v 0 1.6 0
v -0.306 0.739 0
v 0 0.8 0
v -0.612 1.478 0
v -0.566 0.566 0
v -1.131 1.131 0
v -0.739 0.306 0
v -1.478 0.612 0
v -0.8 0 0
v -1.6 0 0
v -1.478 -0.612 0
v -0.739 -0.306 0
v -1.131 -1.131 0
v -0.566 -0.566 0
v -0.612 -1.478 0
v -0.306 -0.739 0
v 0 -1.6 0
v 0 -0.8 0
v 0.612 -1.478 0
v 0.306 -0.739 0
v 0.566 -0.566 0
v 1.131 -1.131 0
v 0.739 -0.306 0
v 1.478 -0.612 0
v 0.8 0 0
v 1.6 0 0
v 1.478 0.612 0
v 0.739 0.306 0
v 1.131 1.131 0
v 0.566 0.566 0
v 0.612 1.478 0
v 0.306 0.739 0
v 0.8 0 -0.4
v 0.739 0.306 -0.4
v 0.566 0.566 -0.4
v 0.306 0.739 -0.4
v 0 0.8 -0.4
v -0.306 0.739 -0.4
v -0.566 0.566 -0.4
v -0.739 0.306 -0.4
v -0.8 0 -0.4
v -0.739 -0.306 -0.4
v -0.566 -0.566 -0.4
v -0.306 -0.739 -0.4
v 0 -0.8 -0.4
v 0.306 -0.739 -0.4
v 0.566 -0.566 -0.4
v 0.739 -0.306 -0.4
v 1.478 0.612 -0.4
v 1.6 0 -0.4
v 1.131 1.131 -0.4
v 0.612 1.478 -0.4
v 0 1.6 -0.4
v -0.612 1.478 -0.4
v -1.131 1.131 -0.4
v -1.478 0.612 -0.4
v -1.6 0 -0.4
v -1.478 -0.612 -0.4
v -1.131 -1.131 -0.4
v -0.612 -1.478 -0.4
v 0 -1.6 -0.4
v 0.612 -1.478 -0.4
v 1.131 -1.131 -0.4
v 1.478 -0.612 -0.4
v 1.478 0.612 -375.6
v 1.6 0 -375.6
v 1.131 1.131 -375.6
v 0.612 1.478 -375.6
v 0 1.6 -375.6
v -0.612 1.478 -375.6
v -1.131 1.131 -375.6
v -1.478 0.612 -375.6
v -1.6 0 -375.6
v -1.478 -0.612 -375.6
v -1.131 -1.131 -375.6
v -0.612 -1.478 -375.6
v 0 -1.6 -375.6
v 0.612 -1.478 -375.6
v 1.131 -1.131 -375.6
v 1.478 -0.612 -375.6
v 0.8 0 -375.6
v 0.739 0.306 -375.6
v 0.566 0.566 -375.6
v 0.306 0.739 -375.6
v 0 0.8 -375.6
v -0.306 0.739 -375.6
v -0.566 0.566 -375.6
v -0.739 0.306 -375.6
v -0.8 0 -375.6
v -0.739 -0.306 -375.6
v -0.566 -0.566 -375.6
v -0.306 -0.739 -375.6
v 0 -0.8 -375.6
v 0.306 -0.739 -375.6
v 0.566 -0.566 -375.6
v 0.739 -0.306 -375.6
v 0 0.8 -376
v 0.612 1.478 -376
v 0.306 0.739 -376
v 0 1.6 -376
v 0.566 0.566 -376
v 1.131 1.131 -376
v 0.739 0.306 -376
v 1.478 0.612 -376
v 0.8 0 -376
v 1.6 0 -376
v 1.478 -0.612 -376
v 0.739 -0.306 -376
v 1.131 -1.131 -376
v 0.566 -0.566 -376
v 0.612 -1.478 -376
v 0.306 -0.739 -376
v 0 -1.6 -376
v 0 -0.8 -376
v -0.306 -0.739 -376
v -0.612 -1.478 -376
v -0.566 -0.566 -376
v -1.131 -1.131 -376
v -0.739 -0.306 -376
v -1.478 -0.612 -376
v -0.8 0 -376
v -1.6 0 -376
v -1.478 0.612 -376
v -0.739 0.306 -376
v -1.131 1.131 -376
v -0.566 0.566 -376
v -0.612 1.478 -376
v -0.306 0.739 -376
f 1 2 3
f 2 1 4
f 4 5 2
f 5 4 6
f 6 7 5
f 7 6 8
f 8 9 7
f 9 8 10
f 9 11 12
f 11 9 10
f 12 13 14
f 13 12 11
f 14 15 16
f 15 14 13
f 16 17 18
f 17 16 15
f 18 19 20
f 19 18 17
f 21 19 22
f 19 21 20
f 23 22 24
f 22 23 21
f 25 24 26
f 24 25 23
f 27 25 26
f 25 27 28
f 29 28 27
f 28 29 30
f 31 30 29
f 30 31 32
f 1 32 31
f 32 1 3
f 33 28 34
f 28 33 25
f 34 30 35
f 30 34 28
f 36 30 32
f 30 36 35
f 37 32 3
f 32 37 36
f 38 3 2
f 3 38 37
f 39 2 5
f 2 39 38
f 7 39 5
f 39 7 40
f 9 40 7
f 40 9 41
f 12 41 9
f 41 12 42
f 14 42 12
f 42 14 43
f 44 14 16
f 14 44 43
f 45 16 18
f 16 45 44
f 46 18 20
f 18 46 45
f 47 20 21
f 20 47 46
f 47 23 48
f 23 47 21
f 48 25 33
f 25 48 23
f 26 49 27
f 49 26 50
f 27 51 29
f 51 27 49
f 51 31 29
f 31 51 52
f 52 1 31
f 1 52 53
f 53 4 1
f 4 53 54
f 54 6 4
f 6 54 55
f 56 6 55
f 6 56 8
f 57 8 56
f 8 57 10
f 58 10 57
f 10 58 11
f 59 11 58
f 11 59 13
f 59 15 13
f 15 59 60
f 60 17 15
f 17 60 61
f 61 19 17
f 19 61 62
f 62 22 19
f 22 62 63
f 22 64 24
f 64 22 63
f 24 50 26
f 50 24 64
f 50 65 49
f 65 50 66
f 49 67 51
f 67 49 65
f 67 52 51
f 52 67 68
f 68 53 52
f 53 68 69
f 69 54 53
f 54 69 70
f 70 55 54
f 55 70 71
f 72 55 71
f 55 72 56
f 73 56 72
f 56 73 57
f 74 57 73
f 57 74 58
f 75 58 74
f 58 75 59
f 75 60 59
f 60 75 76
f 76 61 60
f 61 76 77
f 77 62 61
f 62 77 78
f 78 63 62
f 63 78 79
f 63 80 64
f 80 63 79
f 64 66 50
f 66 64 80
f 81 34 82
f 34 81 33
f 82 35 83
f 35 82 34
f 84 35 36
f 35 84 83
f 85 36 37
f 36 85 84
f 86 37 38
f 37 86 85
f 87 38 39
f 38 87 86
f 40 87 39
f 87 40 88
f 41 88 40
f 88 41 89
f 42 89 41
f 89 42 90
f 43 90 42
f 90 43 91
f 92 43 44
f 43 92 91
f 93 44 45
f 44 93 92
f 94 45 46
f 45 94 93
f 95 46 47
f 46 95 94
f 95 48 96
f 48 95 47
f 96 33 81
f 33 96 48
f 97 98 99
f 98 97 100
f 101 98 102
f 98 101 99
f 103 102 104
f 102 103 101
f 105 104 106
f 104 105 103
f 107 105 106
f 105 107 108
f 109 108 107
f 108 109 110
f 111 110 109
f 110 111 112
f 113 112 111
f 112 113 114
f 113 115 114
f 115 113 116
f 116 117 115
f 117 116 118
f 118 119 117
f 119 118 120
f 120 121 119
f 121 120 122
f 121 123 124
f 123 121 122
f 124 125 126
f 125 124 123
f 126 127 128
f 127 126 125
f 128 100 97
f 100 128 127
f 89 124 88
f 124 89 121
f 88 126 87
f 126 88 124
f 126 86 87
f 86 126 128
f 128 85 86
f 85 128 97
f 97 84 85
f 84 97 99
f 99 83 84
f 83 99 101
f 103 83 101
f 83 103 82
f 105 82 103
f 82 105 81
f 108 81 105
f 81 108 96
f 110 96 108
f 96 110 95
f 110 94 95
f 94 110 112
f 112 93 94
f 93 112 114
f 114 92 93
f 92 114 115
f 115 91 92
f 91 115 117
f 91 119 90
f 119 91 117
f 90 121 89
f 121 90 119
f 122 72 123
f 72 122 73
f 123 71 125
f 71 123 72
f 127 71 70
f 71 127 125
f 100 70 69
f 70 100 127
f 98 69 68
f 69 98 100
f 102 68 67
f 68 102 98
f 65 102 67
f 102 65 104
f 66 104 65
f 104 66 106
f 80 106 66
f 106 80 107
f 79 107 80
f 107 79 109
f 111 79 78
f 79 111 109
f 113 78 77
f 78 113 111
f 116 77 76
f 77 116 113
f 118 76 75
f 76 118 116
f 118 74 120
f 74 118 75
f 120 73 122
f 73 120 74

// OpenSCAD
// file: ../p/4-4ring1.scad
use <../lib.scad>
function ldraw_lib__4_4ring1() = [
// 0 Ring  1 x 1.0
// 0 Name: 4-4ring1.dat
// 0 Author: James Jessiman
// 0 !LDRAW_ORG Primitive UPDATE 2009-01
// 0 !LICENSE Licensed under CC BY 4.0 : see CAreadme.txt
// 
// 0 BFC CERTIFY CCW
  [0,"BFC","CERTIFY"],
  [0,"BFC","CCW"],
// 
// 0 !HISTORY 1998-12-15 [PTadmin] Official Update 1998-10
// 0 !HISTORY 2002-04-08 [BrickCaster] Modified for BFC compliance
// 0 !HISTORY 2002-04-25 [PTadmin] Official Update 2002-02
// 0 !HISTORY 2007-06-24 [PTadmin] Header formatted for Contributor Agreement
// 0 !HISTORY 2008-07-01 [PTadmin] Official Update 2008-01
// 0 !HISTORY 2008-08-26 [cwdee] Switch polygon winding and rename
// 0 !HISTORY 2009-05-02 [PTadmin] Official Update 2009-01
// 
// 
// 4 16 -0.7654 0 1.8478 -0.3827 0 0.9239 0 0 1 0 0 2
  [4,16,-0.7654,0,1.8478,-0.3827,0,0.9239,0,0,1,0,0,2],
// 4 16 -1.4142 0 1.4142 -0.7071 0 0.7071 -0.3827 0 0.9239 -0.7654 0 1.8478
  [4,16,-1.4142,0,1.4142,-0.7071,0,0.7071,-0.3827,0,0.9239,-0.7654,0,1.8478],
// 4 16 -1.8478 0 0.7654 -0.9239 0 0.3827 -0.7071 0 0.7071 -1.4142 0 1.41420
  [4,16,-1.8478,0,0.7654,-0.9239,0,0.3827,-0.7071,0,0.7071,-1.4142,0,1.41420],
// 4 16 -2 0 0 -1 0 0 -0.9239 0 0.3827 -1.8478 0 0.7654
  [4,16,-2,0,0,-1,0,0,-0.9239,0,0.3827,-1.8478,0,0.7654],
// 4 16 -1.8478 0 -0.7654 -0.9239 0 -0.3827 -1 0 0 -2 0 0
  [4,16,-1.8478,0,-0.7654,-0.9239,0,-0.3827,-1,0,0,-2,0,0],
// 4 16 -1.4142 0 -1.4142 -0.7071 0 -0.7071 -0.9239 0 -0.3827 -1.8478 0 -0.7654
  [4,16,-1.4142,0,-1.4142,-0.7071,0,-0.7071,-0.9239,0,-0.3827,-1.8478,0,-0.7654],
// 4 16 -0.7654 0 -1.8478 -0.3827 0 -0.9239 -0.7071 0 -0.7071 -1.4142 0 -1.4142
  [4,16,-0.7654,0,-1.8478,-0.3827,0,-0.9239,-0.7071,0,-0.7071,-1.4142,0,-1.4142],
// 4 16 0 0 -2 0 0 -1 -0.3827 0 -0.9239 -0.7654 0 -1.8478
  [4,16,0,0,-2,0,0,-1,-0.3827,0,-0.9239,-0.7654,0,-1.8478],
// 4 16 0.7654 0 -1.8478 0.3827 0 -0.9239 0 0 -1 0 0 -2
  [4,16,0.7654,0,-1.8478,0.3827,0,-0.9239,0,0,-1,0,0,-2],
// 4 16 1.4142 0 -1.4142 0.7071 0 -0.7071 0.3827 0 -0.9239 0.7654 0 -1.8478
  [4,16,1.4142,0,-1.4142,0.7071,0,-0.7071,0.3827,0,-0.9239,0.7654,0,-1.8478],
// 4 16 1.8478 0 -0.7654 0.9239 0 -0.3827 0.7071 0 -0.7071 1.4142 0 -1.4142
  [4,16,1.8478,0,-0.7654,0.9239,0,-0.3827,0.7071,0,-0.7071,1.4142,0,-1.4142],
// 4 16 2 0 0 1 0 0 0.9239 0 -0.3827 1.8478 0 -0.7654
  [4,16,2,0,0,1,0,0,0.9239,0,-0.3827,1.8478,0,-0.7654],
// 4 16 1.8478 0 0.7654 0.9239 0 0.3827 1 0 0 2 0 0
  [4,16,1.8478,0,0.7654,0.9239,0,0.3827,1,0,0,2,0,0],
// 4 16 1.4142 0 1.4142 0.7071 0 0.7071 0.9239 0 0.3827 1.8478 0 0.7654
  [4,16,1.4142,0,1.4142,0.7071,0,0.7071,0.9239,0,0.3827,1.8478,0,0.7654],
// 4 16 0.7654 0 1.8478 0.3827 0 0.9239 0.7071 0 0.7071 1.4142 0 1.4142
  [4,16,0.7654,0,1.8478,0.3827,0,0.9239,0.7071,0,0.7071,1.4142,0,1.4142],
// 4 16 0 0 2 0 0 1 0.3827 0 0.9239 0.7654 0 1.8478
  [4,16,0,0,2,0,0,1,0.3827,0,0.9239,0.7654,0,1.8478],
// 0
];
module ldraw_lib__4_4ring1(step=0, col=false, unit=2/5, alt=false, line=0.2, solid=!$preview)
    makepoly(ldraw_lib__4_4ring1(), step=step, col=col, unit=unit, alt=alt, line=line, solid=solid);
ldraw_lib__4_4ring1(line=0.2);
// file: ../p/4-4edge.scad
use <../lib.scad>
function ldraw_lib__4_4edge() = [
// 0 Circle 1.0
// 0 Name: 4-4edge.dat
// 0 Author: James Jessiman
// 0 !LDRAW_ORG Primitive UPDATE 2017-01
// 0 !LICENSE Licensed under CC BY 4.0 : see CAreadme.txt
// 
// 0 BFC CERTIFY CCW
  [0,"BFC","CERTIFY"],
  [0,"BFC","CCW"],
// 
// 0 !HISTORY 1998-12-15 [PTadmin] Official Update 1998-10
// 0 !HISTORY 2005-12-28 [PTadmin] Official Update 2005-01
// 0 !HISTORY 2007-06-24 [PTadmin] Header formatted for Contributor Agreement
// 0 !HISTORY 2008-07-01 [PTadmin] Official Update 2008-01
// 0 !HISTORY 2017-01-15 [Steffen] BFCed
// 0 !HISTORY 2017-12-30 [PTadmin] Official Update 2017-01
// 
// 
// 2 24 1 0 0 0.9239 0 0.3827
  [2,24,1,0,0,0.9239,0,0.3827],
// 2 24 0.9239 0 0.3827 0.7071 0 0.7071
  [2,24,0.9239,0,0.3827,0.7071,0,0.7071],
// 2 24 0.7071 0 0.7071 0.3827 0 0.9239
  [2,24,0.7071,0,0.7071,0.3827,0,0.9239],
// 2 24 0.3827 0 0.9239 0 0 1
  [2,24,0.3827,0,0.9239,0,0,1],
// 2 24 0 0 1 -0.3827 0 0.9239
  [2,24,0,0,1,-0.3827,0,0.9239],
// 2 24 -0.3827 0 0.9239 -0.7071 0 0.7071
  [2,24,-0.3827,0,0.9239,-0.7071,0,0.7071],
// 2 24 -0.7071 0 0.7071 -0.9239 0 0.3827
  [2,24,-0.7071,0,0.7071,-0.9239,0,0.3827],
// 2 24 -0.9239 0 0.3827 -1 0 -0
  [2,24,-0.9239,0,0.3827,-1,0,-0],
// 2 24 -1 0 -0 -0.9239 0 -0.3827
  [2,24,-1,0,-0,-0.9239,0,-0.3827],
// 2 24 -0.9239 0 -0.3827 -0.7071 0 -0.7071
  [2,24,-0.9239,0,-0.3827,-0.7071,0,-0.7071],
// 2 24 -0.7071 0 -0.7071 -0.3827 0 -0.9239
  [2,24,-0.7071,0,-0.7071,-0.3827,0,-0.9239],
// 2 24 -0.3827 0 -0.9239 0 0 -1
  [2,24,-0.3827,0,-0.9239,0,0,-1],
// 2 24 0 0 -1 0.3827 0 -0.9239
  [2,24,0,0,-1,0.3827,0,-0.9239],
// 2 24 0.3827 0 -0.9239 0.7071 0 -0.7071
  [2,24,0.3827,0,-0.9239,0.7071,0,-0.7071],
// 2 24 0.7071 0 -0.7071 0.9239 0 -0.3827
  [2,24,0.7071,0,-0.7071,0.9239,0,-0.3827],
// 2 24 0.9239 0 -0.3827 1 0 0
  [2,24,0.9239,0,-0.3827,1,0,0],
];
module ldraw_lib__4_4edge(step=0, col=false, unit=2/5, alt=false, line=0.2, solid=!$preview)
    makepoly(ldraw_lib__4_4edge(), step=step, col=col, unit=unit, alt=alt, line=line, solid=solid);
ldraw_lib__4_4edge(line=0.2);
// file: ../p/4-4cyli.scad
use <../lib.scad>
function ldraw_lib__4_4cyli() = [
// 0 Cylinder 1.0
// 0 Name: 4-4cyli.dat
// 0 Author: James Jessiman
// 0 !LDRAW_ORG Primitive UPDATE 2005-01
// 0 !LICENSE Licensed under CC BY 4.0 : see CAreadme.txt
// 
// 0 BFC CERTIFY CCW
  [0,"BFC","CERTIFY"],
  [0,"BFC","CCW"],
// 
// 0 !HISTORY 1998-12-15 [PTadmin] Official Update 1998-10
// 0 !HISTORY 2002-03-23 [sbliss] Added BFC statement; merged headers from files in distributions LDraw 0.27 and Complete.
// 0 !HISTORY 2002-04-25 [PTadmin] Official Update 2002-02
// 0 !HISTORY 2004-12-14 [guyvivan] BFC CCW
// 0 !HISTORY 2005-12-28 [PTadmin] Official Update 2005-01
// 0 !HISTORY 2007-06-24 [PTadmin] Header formatted for Contributor Agreement
// 0 !HISTORY 2008-07-01 [PTadmin] Official Update 2008-01
// 
// 
// 4 16 1 1 0 0.9239 1 0.3827 0.9239 0 0.3827 1 0 0
  [4,16,1,1,0,0.9239,1,0.3827,0.9239,0,0.3827,1,0,0],
// 5 24 1 0 0 1 1 0 0.9239 0 0.3827 0.9239 0 -0.3827
  [5,24,1,0,0,1,1,0,0.9239,0,0.3827,0.9239,0,-0.3827],
// 4 16 0.9239 1 0.3827 0.7071 1 0.7071 0.7071 0 0.7071 0.9239 0 0.3827
  [4,16,0.9239,1,0.3827,0.7071,1,0.7071,0.7071,0,0.7071,0.9239,0,0.3827],
// 5 24 0.9239 0 0.3827 0.9239 1 0.3827 0.7071 0 0.7071 1 0 0
  [5,24,0.9239,0,0.3827,0.9239,1,0.3827,0.7071,0,0.7071,1,0,0],
// 4 16 0.7071 1 0.7071 0.3827 1 0.9239 0.3827 0 0.9239 0.7071 0 0.7071
  [4,16,0.7071,1,0.7071,0.3827,1,0.9239,0.3827,0,0.9239,0.7071,0,0.7071],
// 5 24 0.7071 0 0.7071 0.7071 1 0.7071 0.3827 0 0.9239 0.9239 0 0.3827
  [5,24,0.7071,0,0.7071,0.7071,1,0.7071,0.3827,0,0.9239,0.9239,0,0.3827],
// 4 16 0.3827 1 0.9239 0 1 1 0 0 1 0.3827 0 0.9239
  [4,16,0.3827,1,0.9239,0,1,1,0,0,1,0.3827,0,0.9239],
// 5 24 0.3827 0 0.9239 0.3827 1 0.9239 0 0 1 0.7071 0 0.7071
  [5,24,0.3827,0,0.9239,0.3827,1,0.9239,0,0,1,0.7071,0,0.7071],
// 4 16 0 1 1 -0.3827 1 0.9239 -0.3827 0 0.9239 0 0 1
  [4,16,0,1,1,-0.3827,1,0.9239,-0.3827,0,0.9239,0,0,1],
// 5 24 0 0 1 0 1 1 -0.3827 0 0.9239 0.3827 0 0.9239
  [5,24,0,0,1,0,1,1,-0.3827,0,0.9239,0.3827,0,0.9239],
// 4 16 -0.3827 1 0.9239 -0.7071 1 0.7071 -0.7071 0 0.7071 -0.3827 0 0.9239
  [4,16,-0.3827,1,0.9239,-0.7071,1,0.7071,-0.7071,0,0.7071,-0.3827,0,0.9239],
// 5 24 -0.3827 0 0.9239 -0.3827 1 0.9239 -0.7071 0 0.7071 0 0 1
  [5,24,-0.3827,0,0.9239,-0.3827,1,0.9239,-0.7071,0,0.7071,0,0,1],
// 4 16 -0.7071 1 0.7071 -0.9239 1 0.3827 -0.9239 0 0.3827 -0.7071 0 0.7071
  [4,16,-0.7071,1,0.7071,-0.9239,1,0.3827,-0.9239,0,0.3827,-0.7071,0,0.7071],
// 5 24 -0.7071 0 0.7071 -0.7071 1 0.7071 -0.9239 0 0.3827 -0.3827 0 0.9239
  [5,24,-0.7071,0,0.7071,-0.7071,1,0.7071,-0.9239,0,0.3827,-0.3827,0,0.9239],
// 4 16 -0.9239 1 0.3827 -1 1 0 -1 0 0 -0.9239 0 0.3827
  [4,16,-0.9239,1,0.3827,-1,1,0,-1,0,0,-0.9239,0,0.3827],
// 5 24 -0.9239 0 0.3827 -0.9239 1 0.3827 -1 0 0 -0.7071 0 0.7071
  [5,24,-0.9239,0,0.3827,-0.9239,1,0.3827,-1,0,0,-0.7071,0,0.7071],
// 4 16 -1 1 0 -0.9239 1 -0.3827 -0.9239 0 -0.3827 -1 0 0
  [4,16,-1,1,0,-0.9239,1,-0.3827,-0.9239,0,-0.3827,-1,0,0],
// 5 24 -1 0 0 -1 1 0 -0.9239 0 -0.3827 -0.9239 0 0.3827
  [5,24,-1,0,0,-1,1,0,-0.9239,0,-0.3827,-0.9239,0,0.3827],
// 4 16 -0.9239 1 -0.3827 -0.7071 1 -0.7071 -0.7071 0 -0.7071 -0.9239 0 -0.3827
  [4,16,-0.9239,1,-0.3827,-0.7071,1,-0.7071,-0.7071,0,-0.7071,-0.9239,0,-0.3827],
// 5 24 -0.9239 0 -0.3827 -0.9239 1 -0.3827 -0.7071 0 -0.7071 -1 0 0
  [5,24,-0.9239,0,-0.3827,-0.9239,1,-0.3827,-0.7071,0,-0.7071,-1,0,0],
// 4 16 -0.7071 1 -0.7071 -0.3827 1 -0.9239 -0.3827 0 -0.9239 -0.7071 0 -0.7071
  [4,16,-0.7071,1,-0.7071,-0.3827,1,-0.9239,-0.3827,0,-0.9239,-0.7071,0,-0.7071],
// 5 24 -0.7071 0 -0.7071 -0.7071 1 -0.7071 -0.3827 0 -0.9239 -0.9239 0 -0.3827
  [5,24,-0.7071,0,-0.7071,-0.7071,1,-0.7071,-0.3827,0,-0.9239,-0.9239,0,-0.3827],
// 4 16 -0.3827 1 -0.9239 0 1 -1 0 0 -1 -0.3827 0 -0.9239
  [4,16,-0.3827,1,-0.9239,0,1,-1,0,0,-1,-0.3827,0,-0.9239],
// 5 24 -0.3827 0 -0.9239 -0.3827 1 -0.9239 0 0 -1 -0.7071 0 -0.7071
  [5,24,-0.3827,0,-0.9239,-0.3827,1,-0.9239,0,0,-1,-0.7071,0,-0.7071],
// 4 16 0 1 -1 0.3827 1 -0.9239 0.3827 0 -0.9239 0 0 -1
  [4,16,0,1,-1,0.3827,1,-0.9239,0.3827,0,-0.9239,0,0,-1],
// 5 24 0 0 -1 0 1 -1 0.3827 0 -0.9239 -0.3827 0 -0.9239
  [5,24,0,0,-1,0,1,-1,0.3827,0,-0.9239,-0.3827,0,-0.9239],
// 4 16 0.3827 1 -0.9239 0.7071 1 -0.7071 0.7071 0 -0.7071 0.3827 0 -0.9239
  [4,16,0.3827,1,-0.9239,0.7071,1,-0.7071,0.7071,0,-0.7071,0.3827,0,-0.9239],
// 5 24 0.3827 0 -0.9239 0.3827 1 -0.9239 0.7071 0 -0.7071 0 0 -1
  [5,24,0.3827,0,-0.9239,0.3827,1,-0.9239,0.7071,0,-0.7071,0,0,-1],
// 4 16 0.7071 1 -0.7071 0.9239 1 -0.3827 0.9239 0 -0.3827 0.7071 0 -0.7071
  [4,16,0.7071,1,-0.7071,0.9239,1,-0.3827,0.9239,0,-0.3827,0.7071,0,-0.7071],
// 5 24 0.7071 0 -0.7071 0.7071 1 -0.7071 0.9239 0 -0.3827 0.3827 0 -0.9239
  [5,24,0.7071,0,-0.7071,0.7071,1,-0.7071,0.9239,0,-0.3827,0.3827,0,-0.9239],
// 4 16 0.9239 1 -0.3827 1 1 0 1 0 0 0.9239 0 -0.3827
  [4,16,0.9239,1,-0.3827,1,1,0,1,0,0,0.9239,0,-0.3827],
// 5 24 0.9239 0 -0.3827 0.9239 1 -0.3827 1 0 0 0.7071 0 -0.7071
  [5,24,0.9239,0,-0.3827,0.9239,1,-0.3827,1,0,0,0.7071,0,-0.7071],
// 0
];
module ldraw_lib__4_4cyli(step=0, col=false, unit=2/5, alt=false, line=0.2, solid=!$preview)
    makepoly(ldraw_lib__4_4cyli(), step=step, col=col, unit=unit, alt=alt, line=line, solid=solid);
ldraw_lib__4_4cyli(line=0.2);
// file: u9053.scad
use <../lib.scad>
use <../p/4-4cyli.scad>
use <../p/4-4edge.scad>
use <../p/4-4ring1.scad>
function ldraw_lib__u9053() = [
// 0 ~Technic Flex-System Hose End
// 0 Name: u9053.dat
// 0 Author: William Howard [WilliamH]
// 0 !LDRAW_ORG Part UPDATE 2011-02
// 0 !LICENSE Licensed under CC BY 2.0 and CC BY 4.0 : see CAreadme.txt
// 
// 0 BFC CERTIFY CCW
  [0,"BFC","CERTIFY"],
  [0,"BFC","CCW"],
// 
// 0 !HISTORY 2011-12-21 [cwdee] Reworked subparting technique
// 0 !HISTORY 2011-12-23 [PTadmin] Renamed from 76
// 0 !HISTORY 2011-12-29 [PTadmin] Official Update 2011-02
// 
// 
// 1 16 0 0 0 2 0 0 0 1 0 0 0 2 4-4ring1.dat
  [1,16,0,0,0,2,0,0,0,1,0,0,0,2, ldraw_lib__4_4ring1()],
// 1 16 0 0 0 2 0 0 0 1 0 0 0 2 4-4edge.dat
  [1,16,0,0,0,2,0,0,0,1,0,0,0,2, ldraw_lib__4_4edge()],
// 0 BFC INVERTNEXT
  [0,"BFC","INVERTNEXT"],
// 1 16 0 0 0 2 0 0 0 1 0 0 0 2 4-4cyli.dat
  [1,16,0,0,0,2,0,0,0,1,0,0,0,2, ldraw_lib__4_4cyli()],
// 1 16 0 0 0 4 0 0 0 1 0 0 0 4 4-4edge.dat
  [1,16,0,0,0,4,0,0,0,1,0,0,0,4, ldraw_lib__4_4edge()],
// 1 16 0 0 0 4 0 0 0 1 0 0 0 4 4-4cyli.dat
  [1,16,0,0,0,4,0,0,0,1,0,0,0,4, ldraw_lib__4_4cyli()],
// 0
];
module ldraw_lib__u9053(step=0, col=false, unit=2/5, alt=false, line=0.2, solid=!$preview)
    makepoly(ldraw_lib__u9053(), step=step, col=col, unit=unit, alt=alt, line=line, solid=solid);
ldraw_lib__u9053(line=0.2);
// file: 77.scad
use <../lib.scad>
use <../p/4-4cyli.scad>
function ldraw_lib__77() = [
// 0 ~Technic Flex-System Hose Segment
// 0 Name: 77.dat
// 0 Author: William Howard [WilliamH]
// 0 !LDRAW_ORG Part UPDATE 2011-02
// 0 !LICENSE Licensed under CC BY 2.0 and CC BY 4.0 : see CAreadme.txt
// 
// 0 BFC CERTIFY CCW
  [0,"BFC","CERTIFY"],
  [0,"BFC","CCW"],
// 
// 0 !HISTORY 2011-12-21 [cwdee] Reworked subparting technique
// 0 !HISTORY 2011-12-29 [PTadmin] Official Update 2011-02
// 
// 
// 1 16 0 0 0 4 0 0 0 1 0 0 0 4 4-4cyli.dat
  [1,16,0,0,0,4,0,0,0,1,0,0,0,4, ldraw_lib__4_4cyli()],
// 0 BFC INVERTNEXT
  [0,"BFC","INVERTNEXT"],
// 1 16 0 0 0 2 0 0 0 1 0 0 0 2 4-4cyli.dat
  [1,16,0,0,0,2,0,0,0,1,0,0,0,2, ldraw_lib__4_4cyli()],
// 0
];
module ldraw_lib__77(step=0, col=false, unit=2/5, alt=false, line=0.2, solid=!$preview)
    makepoly(ldraw_lib__77(), step=step, col=col, unit=unit, alt=alt, line=line, solid=solid);
ldraw_lib__77(line=0.2);
// main file
use <../lib.scad>
use <77.scad>
use <u9053.scad>
function ldraw_lib__80623() = [
// 0 Technic Flex-System Hose 47L (940LDU)
// 0 Name: 80623.dat
// 0 Author: Evert-Jan Boer [ejboer]
// 0 !LDRAW_ORG Part UPDATE 2025-05
// 0 !LICENSE Licensed under CC BY 4.0 : see CAreadme.txt
// 
// 0 BFC CERTIFY CCW
  [0,"BFC","CERTIFY"],
  [0,"BFC","CCW"],
// 
// 0 !KEYWORDS bar, BrickLink 75c47, Rebrickable 75c47, tube
// 
// 0 !HISTORY 2025-05-28 [OrionP] Official Update 2025-05
// 
// 
// 1 16 0 0 0 1 0 0 0 1 0 0 0 1 u9053.dat
  [1,16,0,0,0,1,0,0,0,1,0,0,0,1, ldraw_lib__u9053()],
// 1 16 0 1 0 1 0 0 0 938 0 0 0 1 77.dat
  [1,16,0,1,0,1,0,0,0,938,0,0,0,1, ldraw_lib__77()],
// 1 16 0 940 0 -1 0 0 0 -1 0 0 0 1 u9053.dat
  [1,16,0,940,0,-1,0,0,0,-1,0,0,0,1, ldraw_lib__u9053()],
];
module ldraw_lib__80623(step=0, col=false, unit=2/5, alt=false, line=0.2, solid=!$preview)
    makepoly(ldraw_lib__80623(), step=step, col=col, unit=unit, alt=alt, line=line, solid=solid);
ldraw_lib__80623(line=0.2);
